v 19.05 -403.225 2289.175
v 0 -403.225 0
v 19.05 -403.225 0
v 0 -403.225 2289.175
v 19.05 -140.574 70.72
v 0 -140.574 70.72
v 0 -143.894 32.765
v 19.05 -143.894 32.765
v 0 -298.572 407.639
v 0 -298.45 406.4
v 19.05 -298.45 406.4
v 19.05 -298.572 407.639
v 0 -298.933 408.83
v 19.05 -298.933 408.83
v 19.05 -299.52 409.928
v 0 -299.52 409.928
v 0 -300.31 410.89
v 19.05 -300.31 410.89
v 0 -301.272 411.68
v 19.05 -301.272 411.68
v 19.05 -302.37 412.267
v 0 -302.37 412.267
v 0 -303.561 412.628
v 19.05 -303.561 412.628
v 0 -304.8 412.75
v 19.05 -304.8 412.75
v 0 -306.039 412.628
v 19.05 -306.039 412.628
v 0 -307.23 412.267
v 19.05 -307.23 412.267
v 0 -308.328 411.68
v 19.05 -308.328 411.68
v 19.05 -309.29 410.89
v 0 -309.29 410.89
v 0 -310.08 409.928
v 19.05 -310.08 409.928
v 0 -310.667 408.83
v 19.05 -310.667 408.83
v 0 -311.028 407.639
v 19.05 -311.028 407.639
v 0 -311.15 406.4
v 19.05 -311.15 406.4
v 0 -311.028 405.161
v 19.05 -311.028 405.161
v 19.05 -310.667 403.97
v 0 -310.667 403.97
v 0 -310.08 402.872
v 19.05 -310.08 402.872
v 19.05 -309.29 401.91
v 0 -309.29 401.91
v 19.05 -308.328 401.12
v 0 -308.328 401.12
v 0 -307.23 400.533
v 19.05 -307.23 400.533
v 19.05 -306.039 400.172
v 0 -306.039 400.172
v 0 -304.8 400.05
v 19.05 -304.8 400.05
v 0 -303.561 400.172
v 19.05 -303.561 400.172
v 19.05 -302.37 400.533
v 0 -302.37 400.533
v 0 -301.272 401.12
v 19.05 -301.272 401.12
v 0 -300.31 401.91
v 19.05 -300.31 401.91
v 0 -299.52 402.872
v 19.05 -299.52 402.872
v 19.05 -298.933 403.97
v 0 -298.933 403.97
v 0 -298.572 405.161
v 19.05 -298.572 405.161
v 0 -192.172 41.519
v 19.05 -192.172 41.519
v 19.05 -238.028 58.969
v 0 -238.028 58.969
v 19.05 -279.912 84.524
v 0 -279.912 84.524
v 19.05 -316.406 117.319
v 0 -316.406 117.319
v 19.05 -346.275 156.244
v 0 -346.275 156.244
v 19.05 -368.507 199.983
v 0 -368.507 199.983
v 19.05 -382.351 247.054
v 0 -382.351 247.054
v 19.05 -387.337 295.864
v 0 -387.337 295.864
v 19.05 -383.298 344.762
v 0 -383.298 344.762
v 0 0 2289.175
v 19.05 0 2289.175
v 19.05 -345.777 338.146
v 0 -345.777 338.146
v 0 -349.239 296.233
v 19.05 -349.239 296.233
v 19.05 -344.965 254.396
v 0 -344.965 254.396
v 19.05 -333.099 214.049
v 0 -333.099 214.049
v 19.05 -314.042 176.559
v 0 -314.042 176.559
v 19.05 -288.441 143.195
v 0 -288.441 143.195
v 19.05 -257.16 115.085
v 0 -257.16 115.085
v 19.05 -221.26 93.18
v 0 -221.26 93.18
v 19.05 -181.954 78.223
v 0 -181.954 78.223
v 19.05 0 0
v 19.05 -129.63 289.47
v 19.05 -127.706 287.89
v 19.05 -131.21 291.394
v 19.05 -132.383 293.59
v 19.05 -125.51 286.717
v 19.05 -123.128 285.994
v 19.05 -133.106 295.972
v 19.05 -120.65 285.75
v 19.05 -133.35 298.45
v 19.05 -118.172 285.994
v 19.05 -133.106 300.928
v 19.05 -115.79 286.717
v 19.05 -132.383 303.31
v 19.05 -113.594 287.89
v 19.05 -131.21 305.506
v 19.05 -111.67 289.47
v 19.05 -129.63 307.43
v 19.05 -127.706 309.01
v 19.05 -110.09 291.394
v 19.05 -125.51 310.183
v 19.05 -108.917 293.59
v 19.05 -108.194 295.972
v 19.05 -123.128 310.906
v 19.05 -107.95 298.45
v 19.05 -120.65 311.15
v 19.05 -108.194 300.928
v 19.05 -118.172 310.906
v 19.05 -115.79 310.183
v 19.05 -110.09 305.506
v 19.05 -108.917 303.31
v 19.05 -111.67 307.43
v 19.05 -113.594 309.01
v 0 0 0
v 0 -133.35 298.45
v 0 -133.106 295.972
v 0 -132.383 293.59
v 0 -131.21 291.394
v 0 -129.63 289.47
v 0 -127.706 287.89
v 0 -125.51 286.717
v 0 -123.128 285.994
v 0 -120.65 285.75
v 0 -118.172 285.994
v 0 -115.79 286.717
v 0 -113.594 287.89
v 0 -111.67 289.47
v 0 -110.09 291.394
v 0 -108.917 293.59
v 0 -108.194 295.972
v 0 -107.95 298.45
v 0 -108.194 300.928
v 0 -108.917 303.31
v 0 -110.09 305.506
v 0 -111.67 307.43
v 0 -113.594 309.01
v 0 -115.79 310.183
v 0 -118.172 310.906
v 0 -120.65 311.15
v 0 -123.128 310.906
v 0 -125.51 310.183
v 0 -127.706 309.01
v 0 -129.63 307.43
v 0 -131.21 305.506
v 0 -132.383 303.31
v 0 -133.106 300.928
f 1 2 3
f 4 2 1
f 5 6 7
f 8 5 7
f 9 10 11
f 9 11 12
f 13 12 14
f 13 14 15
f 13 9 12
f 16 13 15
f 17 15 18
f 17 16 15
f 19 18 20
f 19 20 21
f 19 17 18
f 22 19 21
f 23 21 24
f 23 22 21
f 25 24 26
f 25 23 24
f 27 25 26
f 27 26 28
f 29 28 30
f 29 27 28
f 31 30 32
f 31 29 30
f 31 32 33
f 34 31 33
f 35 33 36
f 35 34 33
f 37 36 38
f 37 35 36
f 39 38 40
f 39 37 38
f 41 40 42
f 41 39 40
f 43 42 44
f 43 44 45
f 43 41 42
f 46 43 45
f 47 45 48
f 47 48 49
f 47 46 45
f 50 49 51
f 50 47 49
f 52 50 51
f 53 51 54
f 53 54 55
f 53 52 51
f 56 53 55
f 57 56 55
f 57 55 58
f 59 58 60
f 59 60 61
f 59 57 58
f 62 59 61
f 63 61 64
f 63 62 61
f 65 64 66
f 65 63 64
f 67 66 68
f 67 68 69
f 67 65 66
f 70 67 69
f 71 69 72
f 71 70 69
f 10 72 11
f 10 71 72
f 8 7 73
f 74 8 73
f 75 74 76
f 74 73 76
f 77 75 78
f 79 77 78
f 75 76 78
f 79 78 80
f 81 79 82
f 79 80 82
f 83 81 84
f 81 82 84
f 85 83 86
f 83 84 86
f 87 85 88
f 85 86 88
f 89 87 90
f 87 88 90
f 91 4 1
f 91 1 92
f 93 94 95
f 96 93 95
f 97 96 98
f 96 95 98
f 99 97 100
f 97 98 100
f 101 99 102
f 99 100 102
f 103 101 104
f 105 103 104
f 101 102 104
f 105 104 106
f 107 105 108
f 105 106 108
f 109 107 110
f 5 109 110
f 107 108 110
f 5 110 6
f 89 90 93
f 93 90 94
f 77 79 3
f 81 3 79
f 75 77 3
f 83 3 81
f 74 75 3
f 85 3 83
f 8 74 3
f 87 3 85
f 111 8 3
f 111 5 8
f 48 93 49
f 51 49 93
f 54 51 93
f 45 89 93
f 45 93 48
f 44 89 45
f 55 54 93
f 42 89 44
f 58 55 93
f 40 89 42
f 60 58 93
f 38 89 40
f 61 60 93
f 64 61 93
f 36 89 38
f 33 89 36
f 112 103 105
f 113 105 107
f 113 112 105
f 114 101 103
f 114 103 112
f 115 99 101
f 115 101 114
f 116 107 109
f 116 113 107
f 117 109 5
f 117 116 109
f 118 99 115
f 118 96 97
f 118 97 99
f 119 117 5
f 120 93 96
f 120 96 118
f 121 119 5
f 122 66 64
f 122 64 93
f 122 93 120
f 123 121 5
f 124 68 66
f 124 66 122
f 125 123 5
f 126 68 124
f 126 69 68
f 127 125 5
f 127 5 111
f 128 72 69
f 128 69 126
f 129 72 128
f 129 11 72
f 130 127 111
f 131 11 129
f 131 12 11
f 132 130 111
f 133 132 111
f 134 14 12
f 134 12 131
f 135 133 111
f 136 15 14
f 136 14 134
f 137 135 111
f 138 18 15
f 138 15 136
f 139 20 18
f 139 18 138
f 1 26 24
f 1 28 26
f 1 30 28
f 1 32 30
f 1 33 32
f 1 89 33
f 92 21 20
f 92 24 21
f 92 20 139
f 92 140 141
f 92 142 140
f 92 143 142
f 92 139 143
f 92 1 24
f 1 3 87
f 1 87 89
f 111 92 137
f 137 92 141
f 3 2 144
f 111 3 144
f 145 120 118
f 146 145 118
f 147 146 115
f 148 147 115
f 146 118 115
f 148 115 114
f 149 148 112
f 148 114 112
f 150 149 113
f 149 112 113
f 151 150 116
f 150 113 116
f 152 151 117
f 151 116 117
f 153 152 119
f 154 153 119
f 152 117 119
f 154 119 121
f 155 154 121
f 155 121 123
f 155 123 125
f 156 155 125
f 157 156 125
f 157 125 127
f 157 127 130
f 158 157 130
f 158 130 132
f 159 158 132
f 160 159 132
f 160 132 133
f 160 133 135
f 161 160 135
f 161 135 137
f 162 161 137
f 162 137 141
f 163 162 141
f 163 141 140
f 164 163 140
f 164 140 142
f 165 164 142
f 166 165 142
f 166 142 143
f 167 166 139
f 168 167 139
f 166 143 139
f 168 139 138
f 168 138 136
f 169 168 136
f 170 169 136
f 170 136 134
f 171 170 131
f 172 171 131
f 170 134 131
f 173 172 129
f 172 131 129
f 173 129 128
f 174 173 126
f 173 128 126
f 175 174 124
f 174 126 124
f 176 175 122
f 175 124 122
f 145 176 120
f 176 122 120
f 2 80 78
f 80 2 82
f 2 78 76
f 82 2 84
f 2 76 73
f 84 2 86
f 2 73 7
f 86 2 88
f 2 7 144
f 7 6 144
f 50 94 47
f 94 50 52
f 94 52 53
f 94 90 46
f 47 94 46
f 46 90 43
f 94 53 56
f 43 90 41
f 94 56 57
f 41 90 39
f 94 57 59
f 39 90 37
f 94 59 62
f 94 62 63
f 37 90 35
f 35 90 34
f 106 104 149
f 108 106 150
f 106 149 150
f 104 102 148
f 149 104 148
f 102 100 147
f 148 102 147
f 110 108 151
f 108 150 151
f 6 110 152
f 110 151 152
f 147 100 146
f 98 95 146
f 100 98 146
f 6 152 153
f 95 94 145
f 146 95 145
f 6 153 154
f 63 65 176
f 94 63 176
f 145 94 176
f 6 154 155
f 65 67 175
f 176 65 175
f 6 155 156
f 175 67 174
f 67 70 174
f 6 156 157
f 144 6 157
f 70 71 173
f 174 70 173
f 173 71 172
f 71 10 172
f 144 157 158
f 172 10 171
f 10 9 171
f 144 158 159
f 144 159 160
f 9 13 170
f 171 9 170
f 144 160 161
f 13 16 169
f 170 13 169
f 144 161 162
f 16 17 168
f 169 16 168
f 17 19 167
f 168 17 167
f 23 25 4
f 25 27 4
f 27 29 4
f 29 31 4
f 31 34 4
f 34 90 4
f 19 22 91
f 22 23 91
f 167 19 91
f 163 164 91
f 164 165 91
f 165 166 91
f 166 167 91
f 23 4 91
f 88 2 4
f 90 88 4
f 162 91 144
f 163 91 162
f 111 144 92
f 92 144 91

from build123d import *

# Parameters (mm, degrees)
F0_W     = 403.225
F0_H     = 2289.175
F0_R     = 6.35
F1_DEPTH = 19.05
F2_D     = 25.4


with BuildPart() as f1:
    # F0 (on Right) → F1 (new body)
    with BuildSketch(Plane.YZ):
        with Locations((-201.6125, 1144.5875)):
            Rectangle(F0_W, F0_H)
        with Locations((-304.8, 406.4)):
            Circle(F0_R, mode=Mode.SUBTRACT)
        with BuildLine():
            Line((-383.2982277284, 344.7619689838), (-345.7770523386, 338.1459734147))
            ThreePointArc((-345.7770523386, 338.1459734147), (-302.0105735906, 159.2871373286), (-140.5738027921, 70.7198920162))
            Line((-140.5738027921, 70.7198920162), (-143.8944365908, 32.7648740189))
            ThreePointArc((-143.8944365908, 32.7648740189), (-332.2373358557, 136.0933268834), (-383.2982277284, 344.7619689838))
        make_face(mode=Mode.SUBTRACT)
    extrude(amount=F1_DEPTH)

    # F2 (through all)
    with Locations(Plane(origin=(0, 0, 0), x_dir=(0, 1, 0), z_dir=(-1, 0, 0))):
        with Locations((-120.65, -298.45)):
            Hole(F2_D / 2)


solid = f1.part
